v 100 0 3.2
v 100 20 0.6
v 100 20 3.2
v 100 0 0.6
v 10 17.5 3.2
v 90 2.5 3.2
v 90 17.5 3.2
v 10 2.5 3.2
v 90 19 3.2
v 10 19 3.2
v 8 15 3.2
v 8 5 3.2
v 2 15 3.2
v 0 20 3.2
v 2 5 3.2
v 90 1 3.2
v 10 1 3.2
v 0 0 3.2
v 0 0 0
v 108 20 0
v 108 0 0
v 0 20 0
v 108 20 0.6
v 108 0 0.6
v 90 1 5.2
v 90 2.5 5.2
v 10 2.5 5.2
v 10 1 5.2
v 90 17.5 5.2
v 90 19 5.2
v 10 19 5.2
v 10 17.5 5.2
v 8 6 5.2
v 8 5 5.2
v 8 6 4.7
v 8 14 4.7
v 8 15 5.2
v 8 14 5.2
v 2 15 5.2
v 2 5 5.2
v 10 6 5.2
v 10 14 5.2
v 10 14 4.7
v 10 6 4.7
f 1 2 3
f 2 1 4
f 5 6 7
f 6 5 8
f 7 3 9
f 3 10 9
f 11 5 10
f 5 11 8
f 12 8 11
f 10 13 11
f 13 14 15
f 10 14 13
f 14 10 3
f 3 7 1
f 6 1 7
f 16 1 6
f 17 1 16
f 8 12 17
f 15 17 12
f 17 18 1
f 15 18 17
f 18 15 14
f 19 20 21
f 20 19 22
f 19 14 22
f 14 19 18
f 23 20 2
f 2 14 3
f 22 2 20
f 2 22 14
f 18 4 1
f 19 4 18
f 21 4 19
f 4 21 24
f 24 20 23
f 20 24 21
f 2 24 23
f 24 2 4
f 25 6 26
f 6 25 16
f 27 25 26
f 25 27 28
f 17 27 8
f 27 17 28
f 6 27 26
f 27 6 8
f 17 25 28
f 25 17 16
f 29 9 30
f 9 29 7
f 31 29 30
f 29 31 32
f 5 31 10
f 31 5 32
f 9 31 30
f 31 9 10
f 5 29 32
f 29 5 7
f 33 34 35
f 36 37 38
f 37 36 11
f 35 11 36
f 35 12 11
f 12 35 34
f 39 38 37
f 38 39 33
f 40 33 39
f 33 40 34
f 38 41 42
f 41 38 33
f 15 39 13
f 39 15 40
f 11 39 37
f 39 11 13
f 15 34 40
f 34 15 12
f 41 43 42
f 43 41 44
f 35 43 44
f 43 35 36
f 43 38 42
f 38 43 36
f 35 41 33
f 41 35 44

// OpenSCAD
// Bag clip with living hinge - PETG, 0.4mm nozzle, no supports
// One piece, printed open flat. Lower arm + upper arm meet at hinge mid-plane.
// Fold map (180 about pivot): F(x) = 216 - x, F(z) = 10.4 - z.

part = "arm_lower"; // [arm_lower, arm_upper, assembly]
cadverify_only = "";

Lbody = 100;
Wbody = 20;
Tbody = 3.2;
Hhalf = 8;
Thinge = 0.6;
Bgap = 2.0;
Xpiv = 108;
Zpiv = 5.2;

module instance(name, part, unit = 1) {
    echo(cadverify_instance = [name, part, unit]);
    if (cadverify_only == "" || cadverify_only == name) children();
}

module arm_lower() {
    cube([Lbody, Wbody, Tbody], false);
    translate([Lbody-0.1, 0, 0])
        cube([Hhalf+0.1, Wbody, Thinge], false);
    translate([10, 1, Tbody-0.1])
        cube([80, 1.5, Bgap+0.1], false);
    translate([10, 17.5, Tbody-0.1])
        cube([80, 1.5, Bgap+0.1], false);
    translate([2, 5, Tbody-0.1])
        cube([6, 10, Bgap+0.1], false);
    translate([7.9, 6, 4.7])
        cube([2.1, 8, 0.5], false);
}

module arm_upper() {
    cube([Hhalf+0.1, Wbody, Thinge], false);
    translate([Hhalf-0.1, 0, 0])
        cube([Lbody+0.1, Wbody, Tbody], false);
    translate([100, 5, Tbody-0.1])
        cube([6, 10, Bgap+0.1], false);
    translate([97.9, 6, 4.9])
        cube([2.5, 8, 0.5], false);
    translate([107.9, 6, 0])
        cube([8.1, 8, Tbody], false);
}

if (part == "arm_lower") {
    echo(cadverify_spec = [
        ["bounds", [[0, 0, 0], [108, 20, 5.2]]],
        ["bodies", 1],
        ["through_holes", 0],
        ["support_faces", [["bed", "-z", 1500]]],
        ["overhangs_allowed", [["latch lip", [[7.5, 5.5, 4.5], [10.5, 14.5, 5.5]]]]],
        ["copies", 1],
        ["details", [
            ["arm", "material", [[20, 6, 1.0], [80, 14, 2.2]], 1],
            ["arm_wall", "thickness", [50, 10, 10], [0, 0, -1], 3.2],
            ["hinge", "thickness", [104, 10, 5], [0, 0, -1], 0.6],
            ["rib", "material", [[20, 1.2, 3.5], [80, 2.3, 5.0]], 1],
            ["latch_tower", "material", [[3, 6, 3.5], [7, 14, 5.0]], 1],
            ["latch_lip", "material", [[8.2, 7, 4.8], [9.7, 13, 5.1]], 1],
            ["bag_slot", "void", [[20, 3, 3.5], [80, 17, 5.0]], 1]
        ]]
    ]);
    arm_lower();
} else if (part == "arm_upper") {
    echo(cadverify_spec = [
        ["bounds", [[0, 0, 0], [116, 20, 5.2]]],
        ["bodies", 1],
        ["through_holes", 0],
        ["support_faces", [["bed", "-z", 1500]]],
        ["overhangs_allowed", [["latch lip", [[97.5, 5.5, 4.5], [100.8, 14.5, 5.5]]]]],
        ["copies", 1],
        ["details", [
            ["arm", "material", [[15, 6, 1.0], [80, 14, 2.2]], 0.99],
            ["arm_wall", "thickness", [50, 10, 10], [0, 0, -1], 3.2],
            ["hinge", "thickness", [4, 10, 5], [0, 0, -1], 0.6],
            ["latch_tower", "material", [[100.5, 6, 3.5], [105.5, 14, 5.0]], 1],
            ["latch_lip", "material", [[98.2, 7, 4.8], [100.1, 13, 5.1]], 1],
            ["thumb_tab", "material", [[108.5, 7, 1.0], [115, 13, 2.2]], 1],
            ["field", "void", [[15, 3, 3.5], [80, 17, 5.0]], 1]
        ]]
    ]);
    arm_upper();
} else if (part == "assembly") {
    echo(cadverify_spec = [
        ["bounds", [[0, 0, 0], [224, 20, 5.2]]],
        ["support_faces", [["bed", "-z", 3000]]],
        ["motions", [
            ["close", ["upper"], "rotate", [108, 10, 5.2], [0, -1, 0], [0, 180],
                ["flex", [["upper", "lower", 1.0, "latch snap"]]],
                ["stops", [180]]
            ]
        ]],
        ["assembly_order", [
            [["lower"], [0, 0, 0]],
            [["upper"], [0, 0, -1]]
        ]]
    ]);
    instance("lower", "arm_lower") arm_lower();
    instance("upper", "arm_upper") translate([108, 0, 0]) arm_upper();
}
